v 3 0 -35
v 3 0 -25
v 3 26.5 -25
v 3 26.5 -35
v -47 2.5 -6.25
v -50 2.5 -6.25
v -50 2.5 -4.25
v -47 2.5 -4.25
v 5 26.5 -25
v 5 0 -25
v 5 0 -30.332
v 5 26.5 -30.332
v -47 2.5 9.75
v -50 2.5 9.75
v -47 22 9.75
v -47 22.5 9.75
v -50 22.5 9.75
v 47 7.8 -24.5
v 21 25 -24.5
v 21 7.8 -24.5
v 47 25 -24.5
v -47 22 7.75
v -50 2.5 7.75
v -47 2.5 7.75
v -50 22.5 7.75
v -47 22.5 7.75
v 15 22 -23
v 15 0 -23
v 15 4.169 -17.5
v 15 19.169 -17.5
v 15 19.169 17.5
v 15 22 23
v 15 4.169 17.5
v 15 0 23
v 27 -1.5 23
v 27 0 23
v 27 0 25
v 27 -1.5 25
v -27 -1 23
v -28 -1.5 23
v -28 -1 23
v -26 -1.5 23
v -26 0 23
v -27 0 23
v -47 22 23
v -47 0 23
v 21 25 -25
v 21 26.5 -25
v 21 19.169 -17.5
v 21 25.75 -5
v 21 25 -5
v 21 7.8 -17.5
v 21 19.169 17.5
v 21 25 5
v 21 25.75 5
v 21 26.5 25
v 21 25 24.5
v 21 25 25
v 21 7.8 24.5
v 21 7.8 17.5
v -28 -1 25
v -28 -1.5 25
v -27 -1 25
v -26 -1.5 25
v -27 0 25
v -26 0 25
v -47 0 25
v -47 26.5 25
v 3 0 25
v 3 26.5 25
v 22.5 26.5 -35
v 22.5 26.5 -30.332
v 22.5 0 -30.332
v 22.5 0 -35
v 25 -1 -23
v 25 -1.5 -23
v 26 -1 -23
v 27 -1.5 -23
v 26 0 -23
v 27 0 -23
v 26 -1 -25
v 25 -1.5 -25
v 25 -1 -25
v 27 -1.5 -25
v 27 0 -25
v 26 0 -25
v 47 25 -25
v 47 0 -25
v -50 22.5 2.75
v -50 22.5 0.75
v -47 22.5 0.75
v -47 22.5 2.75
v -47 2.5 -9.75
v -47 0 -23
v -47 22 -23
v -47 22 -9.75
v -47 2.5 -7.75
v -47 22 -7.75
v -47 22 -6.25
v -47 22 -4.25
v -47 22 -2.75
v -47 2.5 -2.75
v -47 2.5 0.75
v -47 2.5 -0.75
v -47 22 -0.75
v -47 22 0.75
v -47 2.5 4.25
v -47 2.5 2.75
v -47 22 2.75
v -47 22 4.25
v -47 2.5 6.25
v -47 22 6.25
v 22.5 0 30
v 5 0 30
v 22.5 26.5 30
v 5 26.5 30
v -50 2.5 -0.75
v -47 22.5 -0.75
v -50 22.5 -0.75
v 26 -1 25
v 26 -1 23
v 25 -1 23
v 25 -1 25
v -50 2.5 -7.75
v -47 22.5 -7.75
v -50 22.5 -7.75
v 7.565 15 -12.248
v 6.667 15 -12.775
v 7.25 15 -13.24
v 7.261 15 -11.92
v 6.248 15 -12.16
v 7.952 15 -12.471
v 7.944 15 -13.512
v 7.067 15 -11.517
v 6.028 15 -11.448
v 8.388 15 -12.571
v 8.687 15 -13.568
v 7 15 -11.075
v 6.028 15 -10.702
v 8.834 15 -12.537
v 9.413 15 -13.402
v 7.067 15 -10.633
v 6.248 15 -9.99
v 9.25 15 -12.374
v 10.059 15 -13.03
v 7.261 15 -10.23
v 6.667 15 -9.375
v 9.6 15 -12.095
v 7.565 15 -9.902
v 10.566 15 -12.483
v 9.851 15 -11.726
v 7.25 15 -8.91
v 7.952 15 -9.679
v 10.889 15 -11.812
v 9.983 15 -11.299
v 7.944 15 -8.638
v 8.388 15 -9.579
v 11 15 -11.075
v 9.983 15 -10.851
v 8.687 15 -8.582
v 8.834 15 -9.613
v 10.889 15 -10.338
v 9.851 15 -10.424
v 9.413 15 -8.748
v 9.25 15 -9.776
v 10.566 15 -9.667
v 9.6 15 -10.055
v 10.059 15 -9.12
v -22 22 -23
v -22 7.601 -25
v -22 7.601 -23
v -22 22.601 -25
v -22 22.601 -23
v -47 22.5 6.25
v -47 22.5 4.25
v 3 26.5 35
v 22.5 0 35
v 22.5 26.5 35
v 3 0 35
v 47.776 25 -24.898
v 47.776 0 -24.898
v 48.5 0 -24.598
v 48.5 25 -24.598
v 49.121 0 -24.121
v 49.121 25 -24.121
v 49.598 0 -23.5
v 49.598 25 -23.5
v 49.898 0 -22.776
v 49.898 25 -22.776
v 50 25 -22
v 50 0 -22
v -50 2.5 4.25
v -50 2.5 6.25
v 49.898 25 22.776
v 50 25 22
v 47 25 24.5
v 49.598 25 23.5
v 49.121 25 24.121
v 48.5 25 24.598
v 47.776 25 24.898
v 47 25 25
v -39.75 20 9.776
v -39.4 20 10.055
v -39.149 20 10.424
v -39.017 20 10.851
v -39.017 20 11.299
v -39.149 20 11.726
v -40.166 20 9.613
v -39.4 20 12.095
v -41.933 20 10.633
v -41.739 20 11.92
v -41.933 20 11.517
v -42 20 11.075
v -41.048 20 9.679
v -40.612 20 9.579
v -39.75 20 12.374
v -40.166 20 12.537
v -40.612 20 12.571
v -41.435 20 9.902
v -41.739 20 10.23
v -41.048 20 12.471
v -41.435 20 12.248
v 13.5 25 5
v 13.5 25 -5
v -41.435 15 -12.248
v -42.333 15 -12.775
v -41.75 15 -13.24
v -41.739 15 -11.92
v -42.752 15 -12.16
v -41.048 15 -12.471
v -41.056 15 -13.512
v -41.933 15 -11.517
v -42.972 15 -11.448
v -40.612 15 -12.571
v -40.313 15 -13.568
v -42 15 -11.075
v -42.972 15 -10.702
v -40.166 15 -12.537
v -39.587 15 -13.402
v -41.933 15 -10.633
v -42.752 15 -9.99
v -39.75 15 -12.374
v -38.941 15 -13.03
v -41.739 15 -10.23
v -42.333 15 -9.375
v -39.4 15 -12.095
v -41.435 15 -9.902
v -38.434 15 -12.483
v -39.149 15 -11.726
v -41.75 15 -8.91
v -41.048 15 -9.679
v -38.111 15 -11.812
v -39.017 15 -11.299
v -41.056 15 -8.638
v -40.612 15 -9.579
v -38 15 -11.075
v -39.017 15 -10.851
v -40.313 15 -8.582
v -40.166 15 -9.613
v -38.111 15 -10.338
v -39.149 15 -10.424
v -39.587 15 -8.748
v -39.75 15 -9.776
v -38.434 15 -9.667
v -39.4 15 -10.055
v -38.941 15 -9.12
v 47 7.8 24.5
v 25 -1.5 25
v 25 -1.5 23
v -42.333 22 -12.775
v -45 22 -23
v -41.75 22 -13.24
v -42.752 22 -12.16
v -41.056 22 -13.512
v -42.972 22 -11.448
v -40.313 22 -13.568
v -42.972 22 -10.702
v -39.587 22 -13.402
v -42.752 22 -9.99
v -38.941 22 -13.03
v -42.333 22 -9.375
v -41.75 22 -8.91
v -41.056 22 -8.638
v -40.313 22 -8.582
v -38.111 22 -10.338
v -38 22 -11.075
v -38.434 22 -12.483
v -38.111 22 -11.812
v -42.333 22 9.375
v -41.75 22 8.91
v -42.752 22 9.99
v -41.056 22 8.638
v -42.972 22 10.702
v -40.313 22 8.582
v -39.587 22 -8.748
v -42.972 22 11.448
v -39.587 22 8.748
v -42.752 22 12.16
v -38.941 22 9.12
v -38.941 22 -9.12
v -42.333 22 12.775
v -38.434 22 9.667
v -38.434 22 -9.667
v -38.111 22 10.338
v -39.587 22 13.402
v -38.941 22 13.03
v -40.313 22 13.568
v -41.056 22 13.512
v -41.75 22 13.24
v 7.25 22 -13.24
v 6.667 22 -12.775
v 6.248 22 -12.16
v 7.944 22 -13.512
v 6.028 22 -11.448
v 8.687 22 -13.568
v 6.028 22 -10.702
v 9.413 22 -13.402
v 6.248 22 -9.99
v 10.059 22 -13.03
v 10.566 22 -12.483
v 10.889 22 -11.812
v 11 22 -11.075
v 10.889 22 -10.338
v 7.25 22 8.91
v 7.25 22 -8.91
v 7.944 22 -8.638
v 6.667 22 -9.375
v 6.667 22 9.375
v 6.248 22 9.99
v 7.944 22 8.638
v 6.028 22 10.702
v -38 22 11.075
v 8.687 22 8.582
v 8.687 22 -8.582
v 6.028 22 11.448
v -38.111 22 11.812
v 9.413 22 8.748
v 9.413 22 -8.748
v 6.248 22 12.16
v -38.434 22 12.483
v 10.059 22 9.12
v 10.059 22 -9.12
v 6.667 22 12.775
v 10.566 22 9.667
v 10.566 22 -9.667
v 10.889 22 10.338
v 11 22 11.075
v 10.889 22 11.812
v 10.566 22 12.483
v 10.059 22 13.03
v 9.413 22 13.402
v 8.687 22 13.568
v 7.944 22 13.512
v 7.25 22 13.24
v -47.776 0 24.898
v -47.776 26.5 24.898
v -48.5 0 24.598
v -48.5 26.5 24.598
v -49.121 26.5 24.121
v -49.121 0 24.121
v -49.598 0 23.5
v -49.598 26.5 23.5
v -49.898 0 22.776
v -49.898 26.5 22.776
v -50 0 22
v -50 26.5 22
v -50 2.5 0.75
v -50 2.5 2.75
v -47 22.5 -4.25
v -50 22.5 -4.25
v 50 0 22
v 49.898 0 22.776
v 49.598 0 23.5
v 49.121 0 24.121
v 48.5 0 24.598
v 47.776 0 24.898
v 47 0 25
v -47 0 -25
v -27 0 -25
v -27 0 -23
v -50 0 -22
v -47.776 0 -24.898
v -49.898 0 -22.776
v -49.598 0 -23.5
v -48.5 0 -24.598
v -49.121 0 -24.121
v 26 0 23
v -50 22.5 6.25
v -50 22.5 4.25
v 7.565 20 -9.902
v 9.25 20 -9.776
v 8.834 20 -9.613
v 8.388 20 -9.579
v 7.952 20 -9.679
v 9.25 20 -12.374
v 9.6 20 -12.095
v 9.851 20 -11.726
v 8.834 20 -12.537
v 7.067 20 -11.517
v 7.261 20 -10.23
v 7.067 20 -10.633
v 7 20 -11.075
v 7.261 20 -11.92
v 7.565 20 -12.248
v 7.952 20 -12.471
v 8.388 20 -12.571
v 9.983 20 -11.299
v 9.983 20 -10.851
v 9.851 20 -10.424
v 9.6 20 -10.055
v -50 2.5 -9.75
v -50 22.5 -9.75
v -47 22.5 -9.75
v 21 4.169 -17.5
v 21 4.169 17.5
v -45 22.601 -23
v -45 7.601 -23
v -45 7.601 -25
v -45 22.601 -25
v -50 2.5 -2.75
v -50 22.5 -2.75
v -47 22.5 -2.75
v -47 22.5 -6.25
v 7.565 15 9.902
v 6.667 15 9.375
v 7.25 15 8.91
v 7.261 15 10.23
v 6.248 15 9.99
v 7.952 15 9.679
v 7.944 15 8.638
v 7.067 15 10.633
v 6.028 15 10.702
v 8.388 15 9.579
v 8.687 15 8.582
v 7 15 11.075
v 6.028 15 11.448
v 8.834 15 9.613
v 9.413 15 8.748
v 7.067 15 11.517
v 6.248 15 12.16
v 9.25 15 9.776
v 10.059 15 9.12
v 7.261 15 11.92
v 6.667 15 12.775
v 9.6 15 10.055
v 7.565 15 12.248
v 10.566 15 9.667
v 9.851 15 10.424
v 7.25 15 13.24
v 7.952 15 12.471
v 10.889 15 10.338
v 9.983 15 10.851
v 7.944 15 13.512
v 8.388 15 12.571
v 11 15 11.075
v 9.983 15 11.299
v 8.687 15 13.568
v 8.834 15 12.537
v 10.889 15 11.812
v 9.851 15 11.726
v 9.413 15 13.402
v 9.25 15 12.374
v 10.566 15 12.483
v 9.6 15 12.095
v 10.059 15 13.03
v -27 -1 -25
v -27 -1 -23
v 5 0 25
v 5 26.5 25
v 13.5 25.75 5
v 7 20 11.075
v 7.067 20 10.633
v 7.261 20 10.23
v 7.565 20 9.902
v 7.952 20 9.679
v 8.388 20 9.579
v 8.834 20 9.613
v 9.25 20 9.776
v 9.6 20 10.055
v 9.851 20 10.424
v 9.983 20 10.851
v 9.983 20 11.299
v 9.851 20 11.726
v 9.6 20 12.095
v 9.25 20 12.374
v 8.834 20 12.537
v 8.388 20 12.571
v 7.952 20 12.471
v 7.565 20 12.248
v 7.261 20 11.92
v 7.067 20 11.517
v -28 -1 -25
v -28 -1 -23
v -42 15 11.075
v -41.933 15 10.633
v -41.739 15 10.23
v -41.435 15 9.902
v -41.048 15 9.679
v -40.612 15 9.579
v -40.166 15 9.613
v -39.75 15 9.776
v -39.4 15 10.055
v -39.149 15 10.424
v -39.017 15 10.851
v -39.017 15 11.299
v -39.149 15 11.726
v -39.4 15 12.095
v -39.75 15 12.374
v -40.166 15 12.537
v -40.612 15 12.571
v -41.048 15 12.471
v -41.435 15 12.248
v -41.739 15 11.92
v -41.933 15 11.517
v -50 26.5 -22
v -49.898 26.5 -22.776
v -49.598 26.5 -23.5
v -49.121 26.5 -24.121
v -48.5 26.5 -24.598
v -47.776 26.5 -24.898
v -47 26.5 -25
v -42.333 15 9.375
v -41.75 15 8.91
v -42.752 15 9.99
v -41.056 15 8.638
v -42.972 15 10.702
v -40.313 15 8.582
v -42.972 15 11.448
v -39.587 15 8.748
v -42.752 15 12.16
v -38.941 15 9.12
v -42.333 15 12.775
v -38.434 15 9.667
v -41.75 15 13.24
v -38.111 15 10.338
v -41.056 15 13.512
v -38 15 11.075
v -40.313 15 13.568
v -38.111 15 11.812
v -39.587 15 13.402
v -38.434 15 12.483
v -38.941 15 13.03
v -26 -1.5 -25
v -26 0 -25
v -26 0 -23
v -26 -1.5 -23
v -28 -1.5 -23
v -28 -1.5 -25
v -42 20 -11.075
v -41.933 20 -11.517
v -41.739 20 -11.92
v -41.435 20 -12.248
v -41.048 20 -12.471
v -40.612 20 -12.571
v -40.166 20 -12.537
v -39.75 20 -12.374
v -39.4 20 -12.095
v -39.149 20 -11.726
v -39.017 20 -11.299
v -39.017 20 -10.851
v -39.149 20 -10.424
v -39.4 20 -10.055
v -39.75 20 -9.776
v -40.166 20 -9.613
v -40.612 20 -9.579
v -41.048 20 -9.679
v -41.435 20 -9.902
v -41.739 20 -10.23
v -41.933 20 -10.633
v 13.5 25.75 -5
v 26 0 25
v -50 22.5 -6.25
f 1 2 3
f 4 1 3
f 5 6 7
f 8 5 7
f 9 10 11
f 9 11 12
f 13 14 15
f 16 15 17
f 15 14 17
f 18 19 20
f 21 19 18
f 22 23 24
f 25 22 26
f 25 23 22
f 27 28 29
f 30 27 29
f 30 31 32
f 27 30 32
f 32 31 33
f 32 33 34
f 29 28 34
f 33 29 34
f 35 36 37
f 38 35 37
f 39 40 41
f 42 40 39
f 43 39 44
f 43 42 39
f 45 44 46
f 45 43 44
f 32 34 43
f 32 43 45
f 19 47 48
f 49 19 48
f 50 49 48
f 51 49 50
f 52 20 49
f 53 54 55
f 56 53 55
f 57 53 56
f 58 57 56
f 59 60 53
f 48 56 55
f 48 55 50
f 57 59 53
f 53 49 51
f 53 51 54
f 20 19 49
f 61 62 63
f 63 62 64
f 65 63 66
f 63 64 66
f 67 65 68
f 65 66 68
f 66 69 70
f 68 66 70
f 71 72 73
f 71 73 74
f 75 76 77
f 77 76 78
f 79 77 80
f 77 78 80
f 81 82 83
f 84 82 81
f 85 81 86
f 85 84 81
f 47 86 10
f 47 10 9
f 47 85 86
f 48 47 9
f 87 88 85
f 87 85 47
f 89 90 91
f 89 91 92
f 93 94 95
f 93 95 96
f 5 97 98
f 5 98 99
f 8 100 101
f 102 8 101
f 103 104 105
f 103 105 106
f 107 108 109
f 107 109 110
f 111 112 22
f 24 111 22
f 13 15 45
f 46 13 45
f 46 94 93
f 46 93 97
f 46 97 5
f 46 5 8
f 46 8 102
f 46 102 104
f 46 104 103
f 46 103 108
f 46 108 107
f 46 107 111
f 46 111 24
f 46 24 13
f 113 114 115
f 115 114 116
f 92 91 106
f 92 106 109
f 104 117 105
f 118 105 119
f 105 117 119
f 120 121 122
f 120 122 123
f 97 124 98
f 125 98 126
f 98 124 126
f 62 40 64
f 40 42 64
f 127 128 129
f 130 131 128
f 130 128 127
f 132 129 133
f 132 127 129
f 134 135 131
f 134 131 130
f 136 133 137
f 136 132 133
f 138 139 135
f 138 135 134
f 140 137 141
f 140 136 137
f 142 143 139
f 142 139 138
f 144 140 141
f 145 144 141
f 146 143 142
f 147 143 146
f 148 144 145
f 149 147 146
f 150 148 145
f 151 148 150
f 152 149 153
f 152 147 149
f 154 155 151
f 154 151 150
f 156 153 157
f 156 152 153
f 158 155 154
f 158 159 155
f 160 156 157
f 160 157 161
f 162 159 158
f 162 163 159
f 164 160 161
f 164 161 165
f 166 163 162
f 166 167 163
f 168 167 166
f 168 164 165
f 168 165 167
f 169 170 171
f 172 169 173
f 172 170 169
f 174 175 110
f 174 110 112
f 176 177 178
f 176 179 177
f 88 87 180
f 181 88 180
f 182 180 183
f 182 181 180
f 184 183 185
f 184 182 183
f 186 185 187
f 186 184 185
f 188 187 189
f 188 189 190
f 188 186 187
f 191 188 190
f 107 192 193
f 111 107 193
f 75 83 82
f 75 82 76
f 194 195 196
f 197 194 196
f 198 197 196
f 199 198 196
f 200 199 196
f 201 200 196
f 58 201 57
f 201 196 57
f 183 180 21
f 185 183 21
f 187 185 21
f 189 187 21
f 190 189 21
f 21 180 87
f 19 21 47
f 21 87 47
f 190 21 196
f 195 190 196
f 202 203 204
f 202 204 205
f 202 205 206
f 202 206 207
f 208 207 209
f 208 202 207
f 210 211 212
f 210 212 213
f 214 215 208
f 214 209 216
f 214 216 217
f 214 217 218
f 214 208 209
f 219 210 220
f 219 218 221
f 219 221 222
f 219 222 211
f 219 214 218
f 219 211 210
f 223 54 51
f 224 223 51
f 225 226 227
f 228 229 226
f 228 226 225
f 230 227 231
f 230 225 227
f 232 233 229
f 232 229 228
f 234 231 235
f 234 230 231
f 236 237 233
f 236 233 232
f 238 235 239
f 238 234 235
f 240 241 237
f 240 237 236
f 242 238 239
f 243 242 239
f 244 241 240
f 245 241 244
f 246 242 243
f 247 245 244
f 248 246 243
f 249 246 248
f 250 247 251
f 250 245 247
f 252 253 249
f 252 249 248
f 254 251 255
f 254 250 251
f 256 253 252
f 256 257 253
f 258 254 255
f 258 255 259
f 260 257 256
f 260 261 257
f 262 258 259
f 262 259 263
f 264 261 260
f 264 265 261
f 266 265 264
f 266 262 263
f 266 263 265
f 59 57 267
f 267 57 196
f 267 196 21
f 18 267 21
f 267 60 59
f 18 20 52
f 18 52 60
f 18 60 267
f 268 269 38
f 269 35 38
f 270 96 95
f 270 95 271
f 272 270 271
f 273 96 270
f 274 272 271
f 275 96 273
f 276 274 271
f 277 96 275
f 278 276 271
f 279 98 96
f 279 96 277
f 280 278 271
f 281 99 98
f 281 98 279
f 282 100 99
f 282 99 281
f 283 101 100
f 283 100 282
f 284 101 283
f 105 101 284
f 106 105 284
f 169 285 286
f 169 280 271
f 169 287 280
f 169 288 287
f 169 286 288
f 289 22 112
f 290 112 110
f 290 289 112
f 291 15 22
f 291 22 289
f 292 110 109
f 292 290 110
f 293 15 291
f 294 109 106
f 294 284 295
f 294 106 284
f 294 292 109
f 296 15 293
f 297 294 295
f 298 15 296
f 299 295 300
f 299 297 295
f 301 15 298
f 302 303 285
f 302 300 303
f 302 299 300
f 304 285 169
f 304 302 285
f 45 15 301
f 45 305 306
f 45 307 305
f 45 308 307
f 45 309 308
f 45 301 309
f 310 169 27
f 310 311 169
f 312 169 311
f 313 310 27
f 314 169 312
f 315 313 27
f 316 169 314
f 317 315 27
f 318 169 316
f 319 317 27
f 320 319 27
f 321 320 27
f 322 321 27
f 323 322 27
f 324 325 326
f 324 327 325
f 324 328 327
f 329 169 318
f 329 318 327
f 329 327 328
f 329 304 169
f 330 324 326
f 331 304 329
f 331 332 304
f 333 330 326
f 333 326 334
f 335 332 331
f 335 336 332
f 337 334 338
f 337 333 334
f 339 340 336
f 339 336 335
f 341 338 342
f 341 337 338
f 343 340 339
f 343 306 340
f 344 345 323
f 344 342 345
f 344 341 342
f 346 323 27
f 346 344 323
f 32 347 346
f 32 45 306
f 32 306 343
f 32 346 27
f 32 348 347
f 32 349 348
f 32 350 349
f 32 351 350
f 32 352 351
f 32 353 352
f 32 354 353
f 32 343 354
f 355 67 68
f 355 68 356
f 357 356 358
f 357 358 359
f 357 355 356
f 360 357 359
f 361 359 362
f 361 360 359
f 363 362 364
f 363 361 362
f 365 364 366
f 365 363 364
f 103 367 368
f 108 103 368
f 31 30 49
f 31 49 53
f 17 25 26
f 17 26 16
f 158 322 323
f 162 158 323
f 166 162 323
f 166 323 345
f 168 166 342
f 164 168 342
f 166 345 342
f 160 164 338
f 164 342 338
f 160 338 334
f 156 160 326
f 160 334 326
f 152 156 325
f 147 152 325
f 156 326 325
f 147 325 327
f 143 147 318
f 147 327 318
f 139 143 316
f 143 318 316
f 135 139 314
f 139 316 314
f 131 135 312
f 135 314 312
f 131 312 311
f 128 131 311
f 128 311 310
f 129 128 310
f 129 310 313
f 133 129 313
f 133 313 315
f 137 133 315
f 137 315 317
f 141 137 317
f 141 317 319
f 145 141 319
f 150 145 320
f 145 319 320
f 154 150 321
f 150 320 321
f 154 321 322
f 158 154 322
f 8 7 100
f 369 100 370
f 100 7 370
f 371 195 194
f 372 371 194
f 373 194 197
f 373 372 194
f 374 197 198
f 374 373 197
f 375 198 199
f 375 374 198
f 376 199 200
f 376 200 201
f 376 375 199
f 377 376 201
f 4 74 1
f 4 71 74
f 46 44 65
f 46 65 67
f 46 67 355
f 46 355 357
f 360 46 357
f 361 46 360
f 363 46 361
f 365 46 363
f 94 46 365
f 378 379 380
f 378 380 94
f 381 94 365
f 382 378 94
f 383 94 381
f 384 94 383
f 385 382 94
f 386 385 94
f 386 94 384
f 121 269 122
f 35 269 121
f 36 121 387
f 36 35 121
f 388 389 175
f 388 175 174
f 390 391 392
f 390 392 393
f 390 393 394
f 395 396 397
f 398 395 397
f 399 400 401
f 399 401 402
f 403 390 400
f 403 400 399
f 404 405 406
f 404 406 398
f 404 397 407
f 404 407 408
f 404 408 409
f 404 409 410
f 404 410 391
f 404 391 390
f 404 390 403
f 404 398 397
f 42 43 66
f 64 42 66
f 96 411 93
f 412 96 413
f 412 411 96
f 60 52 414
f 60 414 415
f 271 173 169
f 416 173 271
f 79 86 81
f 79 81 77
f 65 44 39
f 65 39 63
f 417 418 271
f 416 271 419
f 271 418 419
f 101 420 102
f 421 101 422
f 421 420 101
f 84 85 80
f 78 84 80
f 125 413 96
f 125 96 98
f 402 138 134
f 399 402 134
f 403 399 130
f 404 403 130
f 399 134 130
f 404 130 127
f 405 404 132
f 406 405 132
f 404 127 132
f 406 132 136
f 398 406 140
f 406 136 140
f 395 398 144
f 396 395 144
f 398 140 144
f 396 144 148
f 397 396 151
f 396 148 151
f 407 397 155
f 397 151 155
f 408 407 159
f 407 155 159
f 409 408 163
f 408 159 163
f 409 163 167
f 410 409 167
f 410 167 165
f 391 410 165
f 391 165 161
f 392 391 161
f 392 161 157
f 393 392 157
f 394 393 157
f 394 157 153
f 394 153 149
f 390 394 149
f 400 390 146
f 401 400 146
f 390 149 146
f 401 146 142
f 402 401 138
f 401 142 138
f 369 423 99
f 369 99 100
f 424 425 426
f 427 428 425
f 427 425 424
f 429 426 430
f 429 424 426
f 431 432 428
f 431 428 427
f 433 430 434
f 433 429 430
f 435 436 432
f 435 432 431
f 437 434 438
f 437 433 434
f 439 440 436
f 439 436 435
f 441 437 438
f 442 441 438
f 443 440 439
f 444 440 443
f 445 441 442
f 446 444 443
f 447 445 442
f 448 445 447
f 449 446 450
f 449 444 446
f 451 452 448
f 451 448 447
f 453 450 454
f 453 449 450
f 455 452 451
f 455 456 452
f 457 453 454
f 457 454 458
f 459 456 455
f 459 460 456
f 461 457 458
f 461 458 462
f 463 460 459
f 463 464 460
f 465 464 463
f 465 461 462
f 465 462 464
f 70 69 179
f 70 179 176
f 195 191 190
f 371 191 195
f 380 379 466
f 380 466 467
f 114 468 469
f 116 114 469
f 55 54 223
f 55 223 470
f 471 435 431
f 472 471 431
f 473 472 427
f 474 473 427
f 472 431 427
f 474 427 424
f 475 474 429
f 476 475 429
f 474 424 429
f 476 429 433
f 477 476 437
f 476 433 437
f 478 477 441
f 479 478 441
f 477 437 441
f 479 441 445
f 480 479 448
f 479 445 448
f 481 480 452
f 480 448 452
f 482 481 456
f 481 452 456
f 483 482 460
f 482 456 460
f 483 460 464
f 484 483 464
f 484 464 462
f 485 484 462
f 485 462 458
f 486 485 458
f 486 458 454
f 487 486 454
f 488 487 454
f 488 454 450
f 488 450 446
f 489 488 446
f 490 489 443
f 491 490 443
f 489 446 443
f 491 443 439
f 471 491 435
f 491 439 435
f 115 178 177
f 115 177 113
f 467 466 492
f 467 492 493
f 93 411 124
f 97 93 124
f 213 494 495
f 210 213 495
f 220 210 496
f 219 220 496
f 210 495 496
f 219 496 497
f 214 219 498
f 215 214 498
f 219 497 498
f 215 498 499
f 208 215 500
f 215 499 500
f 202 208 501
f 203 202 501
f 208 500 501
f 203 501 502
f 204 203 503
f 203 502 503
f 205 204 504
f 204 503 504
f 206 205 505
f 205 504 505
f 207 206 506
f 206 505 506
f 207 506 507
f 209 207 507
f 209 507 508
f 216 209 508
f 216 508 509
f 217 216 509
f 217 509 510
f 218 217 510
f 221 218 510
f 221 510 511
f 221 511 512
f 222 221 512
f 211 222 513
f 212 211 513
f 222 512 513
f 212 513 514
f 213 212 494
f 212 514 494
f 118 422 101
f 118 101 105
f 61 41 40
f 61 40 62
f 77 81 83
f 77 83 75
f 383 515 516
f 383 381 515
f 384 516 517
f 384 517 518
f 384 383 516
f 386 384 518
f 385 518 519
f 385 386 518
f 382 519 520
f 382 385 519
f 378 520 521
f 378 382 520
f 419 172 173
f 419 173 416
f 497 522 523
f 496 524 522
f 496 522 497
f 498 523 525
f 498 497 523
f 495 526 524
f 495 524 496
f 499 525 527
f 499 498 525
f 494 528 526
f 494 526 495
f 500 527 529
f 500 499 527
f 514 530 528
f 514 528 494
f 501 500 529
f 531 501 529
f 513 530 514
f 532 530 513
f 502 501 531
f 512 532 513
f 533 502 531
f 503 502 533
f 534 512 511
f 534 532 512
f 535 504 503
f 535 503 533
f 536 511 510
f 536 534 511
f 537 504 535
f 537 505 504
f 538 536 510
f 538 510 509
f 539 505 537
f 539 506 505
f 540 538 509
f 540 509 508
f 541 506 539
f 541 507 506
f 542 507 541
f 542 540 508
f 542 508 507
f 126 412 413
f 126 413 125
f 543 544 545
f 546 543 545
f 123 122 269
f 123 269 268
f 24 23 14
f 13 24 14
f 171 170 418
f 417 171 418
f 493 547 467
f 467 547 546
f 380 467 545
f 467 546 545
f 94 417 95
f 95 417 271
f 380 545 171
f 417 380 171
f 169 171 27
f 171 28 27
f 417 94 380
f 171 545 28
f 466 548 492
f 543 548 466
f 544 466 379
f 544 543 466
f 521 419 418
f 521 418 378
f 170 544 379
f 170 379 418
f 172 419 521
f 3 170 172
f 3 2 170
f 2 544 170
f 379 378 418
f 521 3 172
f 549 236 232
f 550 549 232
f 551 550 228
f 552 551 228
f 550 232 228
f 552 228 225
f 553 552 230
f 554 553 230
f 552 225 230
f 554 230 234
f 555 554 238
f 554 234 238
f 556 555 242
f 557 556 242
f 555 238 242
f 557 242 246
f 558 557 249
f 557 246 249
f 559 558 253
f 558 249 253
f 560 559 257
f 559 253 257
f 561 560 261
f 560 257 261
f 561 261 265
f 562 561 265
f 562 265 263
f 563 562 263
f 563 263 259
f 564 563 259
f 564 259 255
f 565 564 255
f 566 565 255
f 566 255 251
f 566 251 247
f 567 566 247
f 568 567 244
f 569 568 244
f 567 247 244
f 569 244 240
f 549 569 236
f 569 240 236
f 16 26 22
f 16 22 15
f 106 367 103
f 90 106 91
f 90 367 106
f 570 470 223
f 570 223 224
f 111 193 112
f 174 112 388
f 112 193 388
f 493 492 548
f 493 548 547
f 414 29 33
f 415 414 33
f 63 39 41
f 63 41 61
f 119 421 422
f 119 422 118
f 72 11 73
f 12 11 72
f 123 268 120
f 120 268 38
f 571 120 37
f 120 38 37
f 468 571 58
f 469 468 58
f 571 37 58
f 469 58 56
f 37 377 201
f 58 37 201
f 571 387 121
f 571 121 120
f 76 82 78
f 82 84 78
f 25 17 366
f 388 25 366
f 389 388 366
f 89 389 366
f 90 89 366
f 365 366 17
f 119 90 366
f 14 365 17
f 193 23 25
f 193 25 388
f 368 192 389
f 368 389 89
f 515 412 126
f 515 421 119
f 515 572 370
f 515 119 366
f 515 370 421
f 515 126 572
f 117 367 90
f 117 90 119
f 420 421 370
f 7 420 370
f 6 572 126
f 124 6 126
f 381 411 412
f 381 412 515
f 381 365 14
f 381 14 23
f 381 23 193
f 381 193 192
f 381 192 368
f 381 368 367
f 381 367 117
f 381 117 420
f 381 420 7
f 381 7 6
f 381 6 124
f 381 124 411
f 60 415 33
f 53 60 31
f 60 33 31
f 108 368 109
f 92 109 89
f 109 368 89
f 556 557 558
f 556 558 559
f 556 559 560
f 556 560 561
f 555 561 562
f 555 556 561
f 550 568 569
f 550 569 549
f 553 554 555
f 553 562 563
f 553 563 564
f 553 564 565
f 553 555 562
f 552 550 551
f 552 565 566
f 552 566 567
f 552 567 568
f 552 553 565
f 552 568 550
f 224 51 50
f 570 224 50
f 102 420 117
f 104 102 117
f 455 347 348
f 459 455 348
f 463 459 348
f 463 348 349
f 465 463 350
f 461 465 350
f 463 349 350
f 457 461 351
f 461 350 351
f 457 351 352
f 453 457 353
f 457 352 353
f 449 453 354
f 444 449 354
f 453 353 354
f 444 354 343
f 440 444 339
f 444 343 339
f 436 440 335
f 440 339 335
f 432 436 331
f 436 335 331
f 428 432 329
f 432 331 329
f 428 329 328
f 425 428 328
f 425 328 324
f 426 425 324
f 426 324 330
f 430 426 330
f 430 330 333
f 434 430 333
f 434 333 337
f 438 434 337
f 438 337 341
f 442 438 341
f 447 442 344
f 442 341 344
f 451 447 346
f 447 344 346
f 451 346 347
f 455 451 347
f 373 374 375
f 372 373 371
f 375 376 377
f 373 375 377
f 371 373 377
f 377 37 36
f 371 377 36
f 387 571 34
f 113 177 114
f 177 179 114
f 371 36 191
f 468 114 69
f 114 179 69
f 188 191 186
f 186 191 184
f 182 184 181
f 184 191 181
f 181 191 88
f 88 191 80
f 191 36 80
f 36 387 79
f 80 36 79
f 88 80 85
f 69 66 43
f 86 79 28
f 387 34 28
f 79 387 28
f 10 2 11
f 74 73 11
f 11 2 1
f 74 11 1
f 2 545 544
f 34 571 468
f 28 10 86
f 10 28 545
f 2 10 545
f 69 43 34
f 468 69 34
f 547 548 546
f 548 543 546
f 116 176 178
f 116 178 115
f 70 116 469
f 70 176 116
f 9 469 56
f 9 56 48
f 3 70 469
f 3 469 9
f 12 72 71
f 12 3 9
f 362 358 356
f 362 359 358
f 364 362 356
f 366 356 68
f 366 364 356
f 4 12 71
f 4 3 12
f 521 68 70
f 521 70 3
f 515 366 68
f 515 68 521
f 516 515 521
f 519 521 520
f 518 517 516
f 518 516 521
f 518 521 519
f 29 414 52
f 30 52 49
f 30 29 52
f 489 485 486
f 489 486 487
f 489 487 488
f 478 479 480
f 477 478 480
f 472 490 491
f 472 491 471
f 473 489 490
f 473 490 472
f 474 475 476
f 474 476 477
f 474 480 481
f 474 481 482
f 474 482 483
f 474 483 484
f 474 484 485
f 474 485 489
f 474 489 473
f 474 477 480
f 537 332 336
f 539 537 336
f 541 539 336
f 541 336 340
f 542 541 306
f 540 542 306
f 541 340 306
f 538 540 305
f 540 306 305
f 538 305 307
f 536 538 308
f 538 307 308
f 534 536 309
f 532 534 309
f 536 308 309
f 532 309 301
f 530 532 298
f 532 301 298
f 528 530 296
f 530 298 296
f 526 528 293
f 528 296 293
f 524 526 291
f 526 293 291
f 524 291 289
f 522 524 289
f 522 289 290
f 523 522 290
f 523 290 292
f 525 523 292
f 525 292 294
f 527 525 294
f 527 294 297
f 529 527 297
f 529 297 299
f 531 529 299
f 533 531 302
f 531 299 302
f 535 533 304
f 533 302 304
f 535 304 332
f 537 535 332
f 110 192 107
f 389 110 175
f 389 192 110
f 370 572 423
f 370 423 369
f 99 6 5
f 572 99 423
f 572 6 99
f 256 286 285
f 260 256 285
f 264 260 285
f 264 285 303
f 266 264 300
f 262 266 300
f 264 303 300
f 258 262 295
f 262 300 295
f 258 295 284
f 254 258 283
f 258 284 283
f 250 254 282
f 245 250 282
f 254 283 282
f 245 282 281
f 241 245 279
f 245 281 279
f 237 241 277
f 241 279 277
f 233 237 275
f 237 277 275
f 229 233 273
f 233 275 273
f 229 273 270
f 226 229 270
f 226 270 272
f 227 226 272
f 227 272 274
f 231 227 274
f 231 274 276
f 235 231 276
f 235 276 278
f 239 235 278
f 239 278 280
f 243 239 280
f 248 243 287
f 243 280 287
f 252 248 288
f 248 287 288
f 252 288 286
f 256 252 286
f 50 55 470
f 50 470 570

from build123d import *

# Parameters (mm, degrees)
BOSS_EXTRUDE1_DEPTH  = 25
SKETCH3_W            = 26
SKETCH3_H            = 49
CUT_EXTRUDE1_DEPTH   = 17.2
SKETCH4_W            = 62
SKETCH4_H            = 46
CUT_EXTRUDE2_DEPTH   = 22
SKETCH5_W            = 2
SKETCH5_H            = 20
CUT_EXTRUDE4_DEPTH   = 3
SKETCH6_W            = 23
SKETCH6_H            = 15
CUT_EXTRUDE5_DEPTH   = 2
SKETCH7_W            = 35
SKETCH7_H            = 15
CUT_EXTRUDE6_DEPTH   = 6
BOSS_EXTRUDE2_DEPTH  = 1.5
SKETCH9_W            = 10
SKETCH9_H            = 0.75
CUT_EXTRUDE7_DEPTH   = 7.5
SKETCH10_W           = 1
SKETCH10_H           = 2
BOSS_EXTRUDE3_DEPTH  = 1.5
SKETCH11_W           = 1
SKETCH11_H           = 2
BOSS_EXTRUDE4_DEPTH  = 1.5
SKETCH12_W           = 2
SKETCH12_H           = 0.5
BOSS_EXTRUDE5_DEPTH  = 1
SKETCH13_W           = 2
SKETCH13_H           = 0.5
BOSS_EXTRUDE6_DEPTH  = 1
SKETCH14_W           = 2
SKETCH14_H           = 0.5
BOSS_EXTRUDE7_DEPTH  = 1
SKETCH15_W           = 2
SKETCH15_H           = 0.5
BOSS_EXTRUDE8_DEPTH  = 1
SKETCH17_W           = 2
SKETCH17_H           = 26.5
BOSS_EXTRUDE10_DEPTH = 10
SKETCH18_W           = 2
SKETCH18_H           = 26.5
BOSS_EXTRUDE11_DEPTH = 10
SKETCH19_W           = 5
SKETCH19_H           = 26.5
SKETCH19_W_2         = 4.66783526
BOSS_EXTRUDE13_DEPTH = 17.5
SKETCH20_R           = 2.5
BOSS_EXTRUDE14_DEPTH = 7
SKETCH21_R           = 1.5
CUT_EXTRUDE8_DEPTH   = 5


with BuildPart() as part:
    # Sketch2 → Boss-Extrude1 (new body)
    with BuildSketch(Plane(origin=(0, 0, 0), x_dir=(1, 0, 0), z_dir=(0, 1, 0))):
        with BuildLine():
            Line((47, -25), (-47, -25))
            ThreePointArc((-47, -25), (-49.121320344, -24.121320344), (-50, -22))
            Line((-50, -22), (-50, 22))
            ThreePointArc((-50, 22), (-49.121320344, 24.121320344), (-47, 25))
            Line((-47, 25), (47, 25))
            ThreePointArc((47, 25), (49.121320344, 24.121320344), (50, 22))
            Line((50, 22), (50, -22))
            ThreePointArc((50, -22), (49.121320344, -24.121320344), (47, -25))
        make_face()
    extrude(amount=BOSS_EXTRUDE1_DEPTH)

    # Sketch3 → Cut-Extrude1 (cut)
    with BuildSketch(Plane(origin=(0, 25, 0), x_dir=(1, 0, 0), z_dir=(0, 1, 0))):
        with Locations((34, 0)):
            Rectangle(SKETCH3_W, SKETCH3_H)
    extrude(amount=-CUT_EXTRUDE1_DEPTH, mode=Mode.SUBTRACT)

    # Sketch4 → Cut-Extrude2 (cut)
    with BuildSketch(Plane.XZ):
        with Locations((-16, 0)):
            Rectangle(SKETCH4_W, SKETCH4_H)
    extrude(amount=-CUT_EXTRUDE2_DEPTH, mode=Mode.SUBTRACT)

    # Sketch5 → Cut-Extrude4 (cut)
    with BuildSketch(Plane.ZY.offset(50)):
        with Locations((-8.75, 12.5)):
            Rectangle(SKETCH5_W, SKETCH5_H)
        with Locations((-5.25, 12.5)):
            Rectangle(SKETCH5_W, SKETCH5_H)
        with Locations((-1.75, 12.5)):
            Rectangle(SKETCH5_W, SKETCH5_H)
        with Locations((1.75, 12.5)):
            Rectangle(SKETCH5_W, SKETCH5_H)
        with Locations((5.25, 12.5)):
            Rectangle(SKETCH5_W, SKETCH5_H)
        with Locations((8.75, 12.5)):
            Rectangle(SKETCH5_W, SKETCH5_H)
    extrude(amount=-CUT_EXTRUDE4_DEPTH, mode=Mode.SUBTRACT)

    # Sketch6 → Cut-Extrude5 (cut)
    with BuildSketch(Plane(origin=(0, 0, -25), x_dir=(-1, 0, 0), z_dir=(0, 0, -1))):
        with Locations((33.5, 15.101074808)):
            Rectangle(SKETCH6_W, SKETCH6_H)
    extrude(amount=-CUT_EXTRUDE5_DEPTH, mode=Mode.SUBTRACT)

    # Sketch7 → Cut-Extrude6 (cut)
    with BuildSketch(Plane.ZY.offset(-15)):
        with Locations((0, 11.669015381)):
            Rectangle(SKETCH7_W, SKETCH7_H)
    extrude(amount=-CUT_EXTRUDE6_DEPTH, mode=Mode.SUBTRACT)

    # Sketch8 → Boss-Extrude2 (add)
    with BuildSketch(Plane(origin=(0, 25, 0), x_dir=(1, 0, 0), z_dir=(0, 1, 0))):
        with BuildLine():
            Line((-47, 25), (21, 25))
            Line((21, 25), (21, -25))
            Line((21, -25), (-47, -25))
            ThreePointArc((-47, -25), (-49.121320344, -24.121320344), (-50, -22))
            Line((-50, -22), (-50, 22))
            ThreePointArc((-50, 22), (-49.121320344, 24.121320344), (-47, 25))
        make_face()
    extrude(amount=BOSS_EXTRUDE2_DEPTH)

    # Sketch9 → Cut-Extrude7 (cut)
    with BuildSketch(Plane(origin=(21, 0, 0), x_dir=(0, 0, -1), z_dir=(1, 0, 0))):
        with Locations((0, 25.375)):
            Rectangle(SKETCH9_W, SKETCH9_H)
    extrude(amount=-CUT_EXTRUDE7_DEPTH, mode=Mode.SUBTRACT)

    # Sketch10 → Boss-Extrude3 (add)
    with BuildSketch(Plane.XZ):
        with Locations((-26.5, 24)):
            Rectangle(SKETCH10_W, SKETCH10_H)
    extrude(amount=BOSS_EXTRUDE3_DEPTH)

    # Sketch11 → Boss-Extrude4 (add)
    with BuildSketch(Plane.XZ):
        with Locations((-26.5, -24)):
            Rectangle(SKETCH11_W, SKETCH11_H)
        with Locations((26.5, 24)):
            Rectangle(SKETCH11_W, SKETCH11_H)
        with Locations((26.5, -24)):
            Rectangle(SKETCH11_W, SKETCH11_H)
    extrude(amount=BOSS_EXTRUDE4_DEPTH)

    # Sketch12 → Boss-Extrude5 (add)
    with BuildSketch(Plane.ZY.offset(27)):
        with Locations((24, -1.25)):
            Rectangle(SKETCH12_W, SKETCH12_H)
    extrude(amount=BOSS_EXTRUDE5_DEPTH)

    # Sketch13 → Boss-Extrude6 (add)
    with BuildSketch(Plane.ZY.offset(27)):
        with Locations((-24, -1.25)):
            Rectangle(SKETCH13_W, SKETCH13_H)
    extrude(amount=BOSS_EXTRUDE6_DEPTH)

    # Sketch14 → Boss-Extrude7 (add)
    with BuildSketch(Plane.ZY.offset(-26)):
        with Locations((-24, -1.25)):
            Rectangle(SKETCH14_W, SKETCH14_H)
    extrude(amount=BOSS_EXTRUDE7_DEPTH)

    # Sketch15 → Boss-Extrude8 (add)
    with BuildSketch(Plane.ZY.offset(-26)):
        with Locations((24, -1.25)):
            Rectangle(SKETCH15_W, SKETCH15_H)
    extrude(amount=BOSS_EXTRUDE8_DEPTH)

    # Sketch17 → Boss-Extrude10 (add)
    with BuildSketch(Plane.XY.offset(25)):
        with Locations((4, 13.25)):
            Rectangle(SKETCH17_W, SKETCH17_H)
    extrude(amount=BOSS_EXTRUDE10_DEPTH)

    # Sketch18 → Boss-Extrude11 (add)
    with BuildSketch(Plane(origin=(0, 0, -25), x_dir=(-1, 0, 0), z_dir=(0, 0, -1))):
        with Locations((-4, 13.25)):
            Rectangle(SKETCH18_W, SKETCH18_H)
    extrude(amount=BOSS_EXTRUDE11_DEPTH)

    # Sketch19 → Boss-Extrude13 (add)
    with BuildSketch(Plane(origin=(5, 0, 0), x_dir=(0, 0, -1), z_dir=(1, 0, 0))):
        with Locations((-32.5, 13.25)):
            Rectangle(SKETCH19_W, SKETCH19_H)
        with Locations((32.66608237, 13.25)):
            Rectangle(SKETCH19_W_2, SKETCH19_H)
    extrude(amount=BOSS_EXTRUDE13_DEPTH)

    # Sketch20 → Boss-Extrude14 (add)
    with BuildSketch(Plane.XZ.offset(-22)):
        with Locations((-40.5, 11.075)):
            Circle(SKETCH20_R)
        with Locations((8.5, 11.075)):
            Circle(SKETCH20_R)
        with Locations((-40.5, -11.075)):
            Circle(SKETCH20_R)
        with Locations((8.5, -11.075)):
            Circle(SKETCH20_R)
    extrude(amount=BOSS_EXTRUDE14_DEPTH)

    # Sketch21 → Cut-Extrude8 (cut)
    with BuildSketch(Plane(origin=(0, 15, 0), x_dir=(-1, 0, 0), z_dir=(0, -1, 0))):
        with Locations((-8.5, 11.075)):
            Circle(SKETCH21_R)
        with Locations((-8.5, -11.075)):
            Circle(SKETCH21_R)
        with Locations((40.5, 11.075)):
            Circle(SKETCH21_R)
        with Locations((40.5, -11.075)):
            Circle(SKETCH21_R)
    extrude(amount=-CUT_EXTRUDE8_DEPTH, mode=Mode.SUBTRACT)


solid = part.part
